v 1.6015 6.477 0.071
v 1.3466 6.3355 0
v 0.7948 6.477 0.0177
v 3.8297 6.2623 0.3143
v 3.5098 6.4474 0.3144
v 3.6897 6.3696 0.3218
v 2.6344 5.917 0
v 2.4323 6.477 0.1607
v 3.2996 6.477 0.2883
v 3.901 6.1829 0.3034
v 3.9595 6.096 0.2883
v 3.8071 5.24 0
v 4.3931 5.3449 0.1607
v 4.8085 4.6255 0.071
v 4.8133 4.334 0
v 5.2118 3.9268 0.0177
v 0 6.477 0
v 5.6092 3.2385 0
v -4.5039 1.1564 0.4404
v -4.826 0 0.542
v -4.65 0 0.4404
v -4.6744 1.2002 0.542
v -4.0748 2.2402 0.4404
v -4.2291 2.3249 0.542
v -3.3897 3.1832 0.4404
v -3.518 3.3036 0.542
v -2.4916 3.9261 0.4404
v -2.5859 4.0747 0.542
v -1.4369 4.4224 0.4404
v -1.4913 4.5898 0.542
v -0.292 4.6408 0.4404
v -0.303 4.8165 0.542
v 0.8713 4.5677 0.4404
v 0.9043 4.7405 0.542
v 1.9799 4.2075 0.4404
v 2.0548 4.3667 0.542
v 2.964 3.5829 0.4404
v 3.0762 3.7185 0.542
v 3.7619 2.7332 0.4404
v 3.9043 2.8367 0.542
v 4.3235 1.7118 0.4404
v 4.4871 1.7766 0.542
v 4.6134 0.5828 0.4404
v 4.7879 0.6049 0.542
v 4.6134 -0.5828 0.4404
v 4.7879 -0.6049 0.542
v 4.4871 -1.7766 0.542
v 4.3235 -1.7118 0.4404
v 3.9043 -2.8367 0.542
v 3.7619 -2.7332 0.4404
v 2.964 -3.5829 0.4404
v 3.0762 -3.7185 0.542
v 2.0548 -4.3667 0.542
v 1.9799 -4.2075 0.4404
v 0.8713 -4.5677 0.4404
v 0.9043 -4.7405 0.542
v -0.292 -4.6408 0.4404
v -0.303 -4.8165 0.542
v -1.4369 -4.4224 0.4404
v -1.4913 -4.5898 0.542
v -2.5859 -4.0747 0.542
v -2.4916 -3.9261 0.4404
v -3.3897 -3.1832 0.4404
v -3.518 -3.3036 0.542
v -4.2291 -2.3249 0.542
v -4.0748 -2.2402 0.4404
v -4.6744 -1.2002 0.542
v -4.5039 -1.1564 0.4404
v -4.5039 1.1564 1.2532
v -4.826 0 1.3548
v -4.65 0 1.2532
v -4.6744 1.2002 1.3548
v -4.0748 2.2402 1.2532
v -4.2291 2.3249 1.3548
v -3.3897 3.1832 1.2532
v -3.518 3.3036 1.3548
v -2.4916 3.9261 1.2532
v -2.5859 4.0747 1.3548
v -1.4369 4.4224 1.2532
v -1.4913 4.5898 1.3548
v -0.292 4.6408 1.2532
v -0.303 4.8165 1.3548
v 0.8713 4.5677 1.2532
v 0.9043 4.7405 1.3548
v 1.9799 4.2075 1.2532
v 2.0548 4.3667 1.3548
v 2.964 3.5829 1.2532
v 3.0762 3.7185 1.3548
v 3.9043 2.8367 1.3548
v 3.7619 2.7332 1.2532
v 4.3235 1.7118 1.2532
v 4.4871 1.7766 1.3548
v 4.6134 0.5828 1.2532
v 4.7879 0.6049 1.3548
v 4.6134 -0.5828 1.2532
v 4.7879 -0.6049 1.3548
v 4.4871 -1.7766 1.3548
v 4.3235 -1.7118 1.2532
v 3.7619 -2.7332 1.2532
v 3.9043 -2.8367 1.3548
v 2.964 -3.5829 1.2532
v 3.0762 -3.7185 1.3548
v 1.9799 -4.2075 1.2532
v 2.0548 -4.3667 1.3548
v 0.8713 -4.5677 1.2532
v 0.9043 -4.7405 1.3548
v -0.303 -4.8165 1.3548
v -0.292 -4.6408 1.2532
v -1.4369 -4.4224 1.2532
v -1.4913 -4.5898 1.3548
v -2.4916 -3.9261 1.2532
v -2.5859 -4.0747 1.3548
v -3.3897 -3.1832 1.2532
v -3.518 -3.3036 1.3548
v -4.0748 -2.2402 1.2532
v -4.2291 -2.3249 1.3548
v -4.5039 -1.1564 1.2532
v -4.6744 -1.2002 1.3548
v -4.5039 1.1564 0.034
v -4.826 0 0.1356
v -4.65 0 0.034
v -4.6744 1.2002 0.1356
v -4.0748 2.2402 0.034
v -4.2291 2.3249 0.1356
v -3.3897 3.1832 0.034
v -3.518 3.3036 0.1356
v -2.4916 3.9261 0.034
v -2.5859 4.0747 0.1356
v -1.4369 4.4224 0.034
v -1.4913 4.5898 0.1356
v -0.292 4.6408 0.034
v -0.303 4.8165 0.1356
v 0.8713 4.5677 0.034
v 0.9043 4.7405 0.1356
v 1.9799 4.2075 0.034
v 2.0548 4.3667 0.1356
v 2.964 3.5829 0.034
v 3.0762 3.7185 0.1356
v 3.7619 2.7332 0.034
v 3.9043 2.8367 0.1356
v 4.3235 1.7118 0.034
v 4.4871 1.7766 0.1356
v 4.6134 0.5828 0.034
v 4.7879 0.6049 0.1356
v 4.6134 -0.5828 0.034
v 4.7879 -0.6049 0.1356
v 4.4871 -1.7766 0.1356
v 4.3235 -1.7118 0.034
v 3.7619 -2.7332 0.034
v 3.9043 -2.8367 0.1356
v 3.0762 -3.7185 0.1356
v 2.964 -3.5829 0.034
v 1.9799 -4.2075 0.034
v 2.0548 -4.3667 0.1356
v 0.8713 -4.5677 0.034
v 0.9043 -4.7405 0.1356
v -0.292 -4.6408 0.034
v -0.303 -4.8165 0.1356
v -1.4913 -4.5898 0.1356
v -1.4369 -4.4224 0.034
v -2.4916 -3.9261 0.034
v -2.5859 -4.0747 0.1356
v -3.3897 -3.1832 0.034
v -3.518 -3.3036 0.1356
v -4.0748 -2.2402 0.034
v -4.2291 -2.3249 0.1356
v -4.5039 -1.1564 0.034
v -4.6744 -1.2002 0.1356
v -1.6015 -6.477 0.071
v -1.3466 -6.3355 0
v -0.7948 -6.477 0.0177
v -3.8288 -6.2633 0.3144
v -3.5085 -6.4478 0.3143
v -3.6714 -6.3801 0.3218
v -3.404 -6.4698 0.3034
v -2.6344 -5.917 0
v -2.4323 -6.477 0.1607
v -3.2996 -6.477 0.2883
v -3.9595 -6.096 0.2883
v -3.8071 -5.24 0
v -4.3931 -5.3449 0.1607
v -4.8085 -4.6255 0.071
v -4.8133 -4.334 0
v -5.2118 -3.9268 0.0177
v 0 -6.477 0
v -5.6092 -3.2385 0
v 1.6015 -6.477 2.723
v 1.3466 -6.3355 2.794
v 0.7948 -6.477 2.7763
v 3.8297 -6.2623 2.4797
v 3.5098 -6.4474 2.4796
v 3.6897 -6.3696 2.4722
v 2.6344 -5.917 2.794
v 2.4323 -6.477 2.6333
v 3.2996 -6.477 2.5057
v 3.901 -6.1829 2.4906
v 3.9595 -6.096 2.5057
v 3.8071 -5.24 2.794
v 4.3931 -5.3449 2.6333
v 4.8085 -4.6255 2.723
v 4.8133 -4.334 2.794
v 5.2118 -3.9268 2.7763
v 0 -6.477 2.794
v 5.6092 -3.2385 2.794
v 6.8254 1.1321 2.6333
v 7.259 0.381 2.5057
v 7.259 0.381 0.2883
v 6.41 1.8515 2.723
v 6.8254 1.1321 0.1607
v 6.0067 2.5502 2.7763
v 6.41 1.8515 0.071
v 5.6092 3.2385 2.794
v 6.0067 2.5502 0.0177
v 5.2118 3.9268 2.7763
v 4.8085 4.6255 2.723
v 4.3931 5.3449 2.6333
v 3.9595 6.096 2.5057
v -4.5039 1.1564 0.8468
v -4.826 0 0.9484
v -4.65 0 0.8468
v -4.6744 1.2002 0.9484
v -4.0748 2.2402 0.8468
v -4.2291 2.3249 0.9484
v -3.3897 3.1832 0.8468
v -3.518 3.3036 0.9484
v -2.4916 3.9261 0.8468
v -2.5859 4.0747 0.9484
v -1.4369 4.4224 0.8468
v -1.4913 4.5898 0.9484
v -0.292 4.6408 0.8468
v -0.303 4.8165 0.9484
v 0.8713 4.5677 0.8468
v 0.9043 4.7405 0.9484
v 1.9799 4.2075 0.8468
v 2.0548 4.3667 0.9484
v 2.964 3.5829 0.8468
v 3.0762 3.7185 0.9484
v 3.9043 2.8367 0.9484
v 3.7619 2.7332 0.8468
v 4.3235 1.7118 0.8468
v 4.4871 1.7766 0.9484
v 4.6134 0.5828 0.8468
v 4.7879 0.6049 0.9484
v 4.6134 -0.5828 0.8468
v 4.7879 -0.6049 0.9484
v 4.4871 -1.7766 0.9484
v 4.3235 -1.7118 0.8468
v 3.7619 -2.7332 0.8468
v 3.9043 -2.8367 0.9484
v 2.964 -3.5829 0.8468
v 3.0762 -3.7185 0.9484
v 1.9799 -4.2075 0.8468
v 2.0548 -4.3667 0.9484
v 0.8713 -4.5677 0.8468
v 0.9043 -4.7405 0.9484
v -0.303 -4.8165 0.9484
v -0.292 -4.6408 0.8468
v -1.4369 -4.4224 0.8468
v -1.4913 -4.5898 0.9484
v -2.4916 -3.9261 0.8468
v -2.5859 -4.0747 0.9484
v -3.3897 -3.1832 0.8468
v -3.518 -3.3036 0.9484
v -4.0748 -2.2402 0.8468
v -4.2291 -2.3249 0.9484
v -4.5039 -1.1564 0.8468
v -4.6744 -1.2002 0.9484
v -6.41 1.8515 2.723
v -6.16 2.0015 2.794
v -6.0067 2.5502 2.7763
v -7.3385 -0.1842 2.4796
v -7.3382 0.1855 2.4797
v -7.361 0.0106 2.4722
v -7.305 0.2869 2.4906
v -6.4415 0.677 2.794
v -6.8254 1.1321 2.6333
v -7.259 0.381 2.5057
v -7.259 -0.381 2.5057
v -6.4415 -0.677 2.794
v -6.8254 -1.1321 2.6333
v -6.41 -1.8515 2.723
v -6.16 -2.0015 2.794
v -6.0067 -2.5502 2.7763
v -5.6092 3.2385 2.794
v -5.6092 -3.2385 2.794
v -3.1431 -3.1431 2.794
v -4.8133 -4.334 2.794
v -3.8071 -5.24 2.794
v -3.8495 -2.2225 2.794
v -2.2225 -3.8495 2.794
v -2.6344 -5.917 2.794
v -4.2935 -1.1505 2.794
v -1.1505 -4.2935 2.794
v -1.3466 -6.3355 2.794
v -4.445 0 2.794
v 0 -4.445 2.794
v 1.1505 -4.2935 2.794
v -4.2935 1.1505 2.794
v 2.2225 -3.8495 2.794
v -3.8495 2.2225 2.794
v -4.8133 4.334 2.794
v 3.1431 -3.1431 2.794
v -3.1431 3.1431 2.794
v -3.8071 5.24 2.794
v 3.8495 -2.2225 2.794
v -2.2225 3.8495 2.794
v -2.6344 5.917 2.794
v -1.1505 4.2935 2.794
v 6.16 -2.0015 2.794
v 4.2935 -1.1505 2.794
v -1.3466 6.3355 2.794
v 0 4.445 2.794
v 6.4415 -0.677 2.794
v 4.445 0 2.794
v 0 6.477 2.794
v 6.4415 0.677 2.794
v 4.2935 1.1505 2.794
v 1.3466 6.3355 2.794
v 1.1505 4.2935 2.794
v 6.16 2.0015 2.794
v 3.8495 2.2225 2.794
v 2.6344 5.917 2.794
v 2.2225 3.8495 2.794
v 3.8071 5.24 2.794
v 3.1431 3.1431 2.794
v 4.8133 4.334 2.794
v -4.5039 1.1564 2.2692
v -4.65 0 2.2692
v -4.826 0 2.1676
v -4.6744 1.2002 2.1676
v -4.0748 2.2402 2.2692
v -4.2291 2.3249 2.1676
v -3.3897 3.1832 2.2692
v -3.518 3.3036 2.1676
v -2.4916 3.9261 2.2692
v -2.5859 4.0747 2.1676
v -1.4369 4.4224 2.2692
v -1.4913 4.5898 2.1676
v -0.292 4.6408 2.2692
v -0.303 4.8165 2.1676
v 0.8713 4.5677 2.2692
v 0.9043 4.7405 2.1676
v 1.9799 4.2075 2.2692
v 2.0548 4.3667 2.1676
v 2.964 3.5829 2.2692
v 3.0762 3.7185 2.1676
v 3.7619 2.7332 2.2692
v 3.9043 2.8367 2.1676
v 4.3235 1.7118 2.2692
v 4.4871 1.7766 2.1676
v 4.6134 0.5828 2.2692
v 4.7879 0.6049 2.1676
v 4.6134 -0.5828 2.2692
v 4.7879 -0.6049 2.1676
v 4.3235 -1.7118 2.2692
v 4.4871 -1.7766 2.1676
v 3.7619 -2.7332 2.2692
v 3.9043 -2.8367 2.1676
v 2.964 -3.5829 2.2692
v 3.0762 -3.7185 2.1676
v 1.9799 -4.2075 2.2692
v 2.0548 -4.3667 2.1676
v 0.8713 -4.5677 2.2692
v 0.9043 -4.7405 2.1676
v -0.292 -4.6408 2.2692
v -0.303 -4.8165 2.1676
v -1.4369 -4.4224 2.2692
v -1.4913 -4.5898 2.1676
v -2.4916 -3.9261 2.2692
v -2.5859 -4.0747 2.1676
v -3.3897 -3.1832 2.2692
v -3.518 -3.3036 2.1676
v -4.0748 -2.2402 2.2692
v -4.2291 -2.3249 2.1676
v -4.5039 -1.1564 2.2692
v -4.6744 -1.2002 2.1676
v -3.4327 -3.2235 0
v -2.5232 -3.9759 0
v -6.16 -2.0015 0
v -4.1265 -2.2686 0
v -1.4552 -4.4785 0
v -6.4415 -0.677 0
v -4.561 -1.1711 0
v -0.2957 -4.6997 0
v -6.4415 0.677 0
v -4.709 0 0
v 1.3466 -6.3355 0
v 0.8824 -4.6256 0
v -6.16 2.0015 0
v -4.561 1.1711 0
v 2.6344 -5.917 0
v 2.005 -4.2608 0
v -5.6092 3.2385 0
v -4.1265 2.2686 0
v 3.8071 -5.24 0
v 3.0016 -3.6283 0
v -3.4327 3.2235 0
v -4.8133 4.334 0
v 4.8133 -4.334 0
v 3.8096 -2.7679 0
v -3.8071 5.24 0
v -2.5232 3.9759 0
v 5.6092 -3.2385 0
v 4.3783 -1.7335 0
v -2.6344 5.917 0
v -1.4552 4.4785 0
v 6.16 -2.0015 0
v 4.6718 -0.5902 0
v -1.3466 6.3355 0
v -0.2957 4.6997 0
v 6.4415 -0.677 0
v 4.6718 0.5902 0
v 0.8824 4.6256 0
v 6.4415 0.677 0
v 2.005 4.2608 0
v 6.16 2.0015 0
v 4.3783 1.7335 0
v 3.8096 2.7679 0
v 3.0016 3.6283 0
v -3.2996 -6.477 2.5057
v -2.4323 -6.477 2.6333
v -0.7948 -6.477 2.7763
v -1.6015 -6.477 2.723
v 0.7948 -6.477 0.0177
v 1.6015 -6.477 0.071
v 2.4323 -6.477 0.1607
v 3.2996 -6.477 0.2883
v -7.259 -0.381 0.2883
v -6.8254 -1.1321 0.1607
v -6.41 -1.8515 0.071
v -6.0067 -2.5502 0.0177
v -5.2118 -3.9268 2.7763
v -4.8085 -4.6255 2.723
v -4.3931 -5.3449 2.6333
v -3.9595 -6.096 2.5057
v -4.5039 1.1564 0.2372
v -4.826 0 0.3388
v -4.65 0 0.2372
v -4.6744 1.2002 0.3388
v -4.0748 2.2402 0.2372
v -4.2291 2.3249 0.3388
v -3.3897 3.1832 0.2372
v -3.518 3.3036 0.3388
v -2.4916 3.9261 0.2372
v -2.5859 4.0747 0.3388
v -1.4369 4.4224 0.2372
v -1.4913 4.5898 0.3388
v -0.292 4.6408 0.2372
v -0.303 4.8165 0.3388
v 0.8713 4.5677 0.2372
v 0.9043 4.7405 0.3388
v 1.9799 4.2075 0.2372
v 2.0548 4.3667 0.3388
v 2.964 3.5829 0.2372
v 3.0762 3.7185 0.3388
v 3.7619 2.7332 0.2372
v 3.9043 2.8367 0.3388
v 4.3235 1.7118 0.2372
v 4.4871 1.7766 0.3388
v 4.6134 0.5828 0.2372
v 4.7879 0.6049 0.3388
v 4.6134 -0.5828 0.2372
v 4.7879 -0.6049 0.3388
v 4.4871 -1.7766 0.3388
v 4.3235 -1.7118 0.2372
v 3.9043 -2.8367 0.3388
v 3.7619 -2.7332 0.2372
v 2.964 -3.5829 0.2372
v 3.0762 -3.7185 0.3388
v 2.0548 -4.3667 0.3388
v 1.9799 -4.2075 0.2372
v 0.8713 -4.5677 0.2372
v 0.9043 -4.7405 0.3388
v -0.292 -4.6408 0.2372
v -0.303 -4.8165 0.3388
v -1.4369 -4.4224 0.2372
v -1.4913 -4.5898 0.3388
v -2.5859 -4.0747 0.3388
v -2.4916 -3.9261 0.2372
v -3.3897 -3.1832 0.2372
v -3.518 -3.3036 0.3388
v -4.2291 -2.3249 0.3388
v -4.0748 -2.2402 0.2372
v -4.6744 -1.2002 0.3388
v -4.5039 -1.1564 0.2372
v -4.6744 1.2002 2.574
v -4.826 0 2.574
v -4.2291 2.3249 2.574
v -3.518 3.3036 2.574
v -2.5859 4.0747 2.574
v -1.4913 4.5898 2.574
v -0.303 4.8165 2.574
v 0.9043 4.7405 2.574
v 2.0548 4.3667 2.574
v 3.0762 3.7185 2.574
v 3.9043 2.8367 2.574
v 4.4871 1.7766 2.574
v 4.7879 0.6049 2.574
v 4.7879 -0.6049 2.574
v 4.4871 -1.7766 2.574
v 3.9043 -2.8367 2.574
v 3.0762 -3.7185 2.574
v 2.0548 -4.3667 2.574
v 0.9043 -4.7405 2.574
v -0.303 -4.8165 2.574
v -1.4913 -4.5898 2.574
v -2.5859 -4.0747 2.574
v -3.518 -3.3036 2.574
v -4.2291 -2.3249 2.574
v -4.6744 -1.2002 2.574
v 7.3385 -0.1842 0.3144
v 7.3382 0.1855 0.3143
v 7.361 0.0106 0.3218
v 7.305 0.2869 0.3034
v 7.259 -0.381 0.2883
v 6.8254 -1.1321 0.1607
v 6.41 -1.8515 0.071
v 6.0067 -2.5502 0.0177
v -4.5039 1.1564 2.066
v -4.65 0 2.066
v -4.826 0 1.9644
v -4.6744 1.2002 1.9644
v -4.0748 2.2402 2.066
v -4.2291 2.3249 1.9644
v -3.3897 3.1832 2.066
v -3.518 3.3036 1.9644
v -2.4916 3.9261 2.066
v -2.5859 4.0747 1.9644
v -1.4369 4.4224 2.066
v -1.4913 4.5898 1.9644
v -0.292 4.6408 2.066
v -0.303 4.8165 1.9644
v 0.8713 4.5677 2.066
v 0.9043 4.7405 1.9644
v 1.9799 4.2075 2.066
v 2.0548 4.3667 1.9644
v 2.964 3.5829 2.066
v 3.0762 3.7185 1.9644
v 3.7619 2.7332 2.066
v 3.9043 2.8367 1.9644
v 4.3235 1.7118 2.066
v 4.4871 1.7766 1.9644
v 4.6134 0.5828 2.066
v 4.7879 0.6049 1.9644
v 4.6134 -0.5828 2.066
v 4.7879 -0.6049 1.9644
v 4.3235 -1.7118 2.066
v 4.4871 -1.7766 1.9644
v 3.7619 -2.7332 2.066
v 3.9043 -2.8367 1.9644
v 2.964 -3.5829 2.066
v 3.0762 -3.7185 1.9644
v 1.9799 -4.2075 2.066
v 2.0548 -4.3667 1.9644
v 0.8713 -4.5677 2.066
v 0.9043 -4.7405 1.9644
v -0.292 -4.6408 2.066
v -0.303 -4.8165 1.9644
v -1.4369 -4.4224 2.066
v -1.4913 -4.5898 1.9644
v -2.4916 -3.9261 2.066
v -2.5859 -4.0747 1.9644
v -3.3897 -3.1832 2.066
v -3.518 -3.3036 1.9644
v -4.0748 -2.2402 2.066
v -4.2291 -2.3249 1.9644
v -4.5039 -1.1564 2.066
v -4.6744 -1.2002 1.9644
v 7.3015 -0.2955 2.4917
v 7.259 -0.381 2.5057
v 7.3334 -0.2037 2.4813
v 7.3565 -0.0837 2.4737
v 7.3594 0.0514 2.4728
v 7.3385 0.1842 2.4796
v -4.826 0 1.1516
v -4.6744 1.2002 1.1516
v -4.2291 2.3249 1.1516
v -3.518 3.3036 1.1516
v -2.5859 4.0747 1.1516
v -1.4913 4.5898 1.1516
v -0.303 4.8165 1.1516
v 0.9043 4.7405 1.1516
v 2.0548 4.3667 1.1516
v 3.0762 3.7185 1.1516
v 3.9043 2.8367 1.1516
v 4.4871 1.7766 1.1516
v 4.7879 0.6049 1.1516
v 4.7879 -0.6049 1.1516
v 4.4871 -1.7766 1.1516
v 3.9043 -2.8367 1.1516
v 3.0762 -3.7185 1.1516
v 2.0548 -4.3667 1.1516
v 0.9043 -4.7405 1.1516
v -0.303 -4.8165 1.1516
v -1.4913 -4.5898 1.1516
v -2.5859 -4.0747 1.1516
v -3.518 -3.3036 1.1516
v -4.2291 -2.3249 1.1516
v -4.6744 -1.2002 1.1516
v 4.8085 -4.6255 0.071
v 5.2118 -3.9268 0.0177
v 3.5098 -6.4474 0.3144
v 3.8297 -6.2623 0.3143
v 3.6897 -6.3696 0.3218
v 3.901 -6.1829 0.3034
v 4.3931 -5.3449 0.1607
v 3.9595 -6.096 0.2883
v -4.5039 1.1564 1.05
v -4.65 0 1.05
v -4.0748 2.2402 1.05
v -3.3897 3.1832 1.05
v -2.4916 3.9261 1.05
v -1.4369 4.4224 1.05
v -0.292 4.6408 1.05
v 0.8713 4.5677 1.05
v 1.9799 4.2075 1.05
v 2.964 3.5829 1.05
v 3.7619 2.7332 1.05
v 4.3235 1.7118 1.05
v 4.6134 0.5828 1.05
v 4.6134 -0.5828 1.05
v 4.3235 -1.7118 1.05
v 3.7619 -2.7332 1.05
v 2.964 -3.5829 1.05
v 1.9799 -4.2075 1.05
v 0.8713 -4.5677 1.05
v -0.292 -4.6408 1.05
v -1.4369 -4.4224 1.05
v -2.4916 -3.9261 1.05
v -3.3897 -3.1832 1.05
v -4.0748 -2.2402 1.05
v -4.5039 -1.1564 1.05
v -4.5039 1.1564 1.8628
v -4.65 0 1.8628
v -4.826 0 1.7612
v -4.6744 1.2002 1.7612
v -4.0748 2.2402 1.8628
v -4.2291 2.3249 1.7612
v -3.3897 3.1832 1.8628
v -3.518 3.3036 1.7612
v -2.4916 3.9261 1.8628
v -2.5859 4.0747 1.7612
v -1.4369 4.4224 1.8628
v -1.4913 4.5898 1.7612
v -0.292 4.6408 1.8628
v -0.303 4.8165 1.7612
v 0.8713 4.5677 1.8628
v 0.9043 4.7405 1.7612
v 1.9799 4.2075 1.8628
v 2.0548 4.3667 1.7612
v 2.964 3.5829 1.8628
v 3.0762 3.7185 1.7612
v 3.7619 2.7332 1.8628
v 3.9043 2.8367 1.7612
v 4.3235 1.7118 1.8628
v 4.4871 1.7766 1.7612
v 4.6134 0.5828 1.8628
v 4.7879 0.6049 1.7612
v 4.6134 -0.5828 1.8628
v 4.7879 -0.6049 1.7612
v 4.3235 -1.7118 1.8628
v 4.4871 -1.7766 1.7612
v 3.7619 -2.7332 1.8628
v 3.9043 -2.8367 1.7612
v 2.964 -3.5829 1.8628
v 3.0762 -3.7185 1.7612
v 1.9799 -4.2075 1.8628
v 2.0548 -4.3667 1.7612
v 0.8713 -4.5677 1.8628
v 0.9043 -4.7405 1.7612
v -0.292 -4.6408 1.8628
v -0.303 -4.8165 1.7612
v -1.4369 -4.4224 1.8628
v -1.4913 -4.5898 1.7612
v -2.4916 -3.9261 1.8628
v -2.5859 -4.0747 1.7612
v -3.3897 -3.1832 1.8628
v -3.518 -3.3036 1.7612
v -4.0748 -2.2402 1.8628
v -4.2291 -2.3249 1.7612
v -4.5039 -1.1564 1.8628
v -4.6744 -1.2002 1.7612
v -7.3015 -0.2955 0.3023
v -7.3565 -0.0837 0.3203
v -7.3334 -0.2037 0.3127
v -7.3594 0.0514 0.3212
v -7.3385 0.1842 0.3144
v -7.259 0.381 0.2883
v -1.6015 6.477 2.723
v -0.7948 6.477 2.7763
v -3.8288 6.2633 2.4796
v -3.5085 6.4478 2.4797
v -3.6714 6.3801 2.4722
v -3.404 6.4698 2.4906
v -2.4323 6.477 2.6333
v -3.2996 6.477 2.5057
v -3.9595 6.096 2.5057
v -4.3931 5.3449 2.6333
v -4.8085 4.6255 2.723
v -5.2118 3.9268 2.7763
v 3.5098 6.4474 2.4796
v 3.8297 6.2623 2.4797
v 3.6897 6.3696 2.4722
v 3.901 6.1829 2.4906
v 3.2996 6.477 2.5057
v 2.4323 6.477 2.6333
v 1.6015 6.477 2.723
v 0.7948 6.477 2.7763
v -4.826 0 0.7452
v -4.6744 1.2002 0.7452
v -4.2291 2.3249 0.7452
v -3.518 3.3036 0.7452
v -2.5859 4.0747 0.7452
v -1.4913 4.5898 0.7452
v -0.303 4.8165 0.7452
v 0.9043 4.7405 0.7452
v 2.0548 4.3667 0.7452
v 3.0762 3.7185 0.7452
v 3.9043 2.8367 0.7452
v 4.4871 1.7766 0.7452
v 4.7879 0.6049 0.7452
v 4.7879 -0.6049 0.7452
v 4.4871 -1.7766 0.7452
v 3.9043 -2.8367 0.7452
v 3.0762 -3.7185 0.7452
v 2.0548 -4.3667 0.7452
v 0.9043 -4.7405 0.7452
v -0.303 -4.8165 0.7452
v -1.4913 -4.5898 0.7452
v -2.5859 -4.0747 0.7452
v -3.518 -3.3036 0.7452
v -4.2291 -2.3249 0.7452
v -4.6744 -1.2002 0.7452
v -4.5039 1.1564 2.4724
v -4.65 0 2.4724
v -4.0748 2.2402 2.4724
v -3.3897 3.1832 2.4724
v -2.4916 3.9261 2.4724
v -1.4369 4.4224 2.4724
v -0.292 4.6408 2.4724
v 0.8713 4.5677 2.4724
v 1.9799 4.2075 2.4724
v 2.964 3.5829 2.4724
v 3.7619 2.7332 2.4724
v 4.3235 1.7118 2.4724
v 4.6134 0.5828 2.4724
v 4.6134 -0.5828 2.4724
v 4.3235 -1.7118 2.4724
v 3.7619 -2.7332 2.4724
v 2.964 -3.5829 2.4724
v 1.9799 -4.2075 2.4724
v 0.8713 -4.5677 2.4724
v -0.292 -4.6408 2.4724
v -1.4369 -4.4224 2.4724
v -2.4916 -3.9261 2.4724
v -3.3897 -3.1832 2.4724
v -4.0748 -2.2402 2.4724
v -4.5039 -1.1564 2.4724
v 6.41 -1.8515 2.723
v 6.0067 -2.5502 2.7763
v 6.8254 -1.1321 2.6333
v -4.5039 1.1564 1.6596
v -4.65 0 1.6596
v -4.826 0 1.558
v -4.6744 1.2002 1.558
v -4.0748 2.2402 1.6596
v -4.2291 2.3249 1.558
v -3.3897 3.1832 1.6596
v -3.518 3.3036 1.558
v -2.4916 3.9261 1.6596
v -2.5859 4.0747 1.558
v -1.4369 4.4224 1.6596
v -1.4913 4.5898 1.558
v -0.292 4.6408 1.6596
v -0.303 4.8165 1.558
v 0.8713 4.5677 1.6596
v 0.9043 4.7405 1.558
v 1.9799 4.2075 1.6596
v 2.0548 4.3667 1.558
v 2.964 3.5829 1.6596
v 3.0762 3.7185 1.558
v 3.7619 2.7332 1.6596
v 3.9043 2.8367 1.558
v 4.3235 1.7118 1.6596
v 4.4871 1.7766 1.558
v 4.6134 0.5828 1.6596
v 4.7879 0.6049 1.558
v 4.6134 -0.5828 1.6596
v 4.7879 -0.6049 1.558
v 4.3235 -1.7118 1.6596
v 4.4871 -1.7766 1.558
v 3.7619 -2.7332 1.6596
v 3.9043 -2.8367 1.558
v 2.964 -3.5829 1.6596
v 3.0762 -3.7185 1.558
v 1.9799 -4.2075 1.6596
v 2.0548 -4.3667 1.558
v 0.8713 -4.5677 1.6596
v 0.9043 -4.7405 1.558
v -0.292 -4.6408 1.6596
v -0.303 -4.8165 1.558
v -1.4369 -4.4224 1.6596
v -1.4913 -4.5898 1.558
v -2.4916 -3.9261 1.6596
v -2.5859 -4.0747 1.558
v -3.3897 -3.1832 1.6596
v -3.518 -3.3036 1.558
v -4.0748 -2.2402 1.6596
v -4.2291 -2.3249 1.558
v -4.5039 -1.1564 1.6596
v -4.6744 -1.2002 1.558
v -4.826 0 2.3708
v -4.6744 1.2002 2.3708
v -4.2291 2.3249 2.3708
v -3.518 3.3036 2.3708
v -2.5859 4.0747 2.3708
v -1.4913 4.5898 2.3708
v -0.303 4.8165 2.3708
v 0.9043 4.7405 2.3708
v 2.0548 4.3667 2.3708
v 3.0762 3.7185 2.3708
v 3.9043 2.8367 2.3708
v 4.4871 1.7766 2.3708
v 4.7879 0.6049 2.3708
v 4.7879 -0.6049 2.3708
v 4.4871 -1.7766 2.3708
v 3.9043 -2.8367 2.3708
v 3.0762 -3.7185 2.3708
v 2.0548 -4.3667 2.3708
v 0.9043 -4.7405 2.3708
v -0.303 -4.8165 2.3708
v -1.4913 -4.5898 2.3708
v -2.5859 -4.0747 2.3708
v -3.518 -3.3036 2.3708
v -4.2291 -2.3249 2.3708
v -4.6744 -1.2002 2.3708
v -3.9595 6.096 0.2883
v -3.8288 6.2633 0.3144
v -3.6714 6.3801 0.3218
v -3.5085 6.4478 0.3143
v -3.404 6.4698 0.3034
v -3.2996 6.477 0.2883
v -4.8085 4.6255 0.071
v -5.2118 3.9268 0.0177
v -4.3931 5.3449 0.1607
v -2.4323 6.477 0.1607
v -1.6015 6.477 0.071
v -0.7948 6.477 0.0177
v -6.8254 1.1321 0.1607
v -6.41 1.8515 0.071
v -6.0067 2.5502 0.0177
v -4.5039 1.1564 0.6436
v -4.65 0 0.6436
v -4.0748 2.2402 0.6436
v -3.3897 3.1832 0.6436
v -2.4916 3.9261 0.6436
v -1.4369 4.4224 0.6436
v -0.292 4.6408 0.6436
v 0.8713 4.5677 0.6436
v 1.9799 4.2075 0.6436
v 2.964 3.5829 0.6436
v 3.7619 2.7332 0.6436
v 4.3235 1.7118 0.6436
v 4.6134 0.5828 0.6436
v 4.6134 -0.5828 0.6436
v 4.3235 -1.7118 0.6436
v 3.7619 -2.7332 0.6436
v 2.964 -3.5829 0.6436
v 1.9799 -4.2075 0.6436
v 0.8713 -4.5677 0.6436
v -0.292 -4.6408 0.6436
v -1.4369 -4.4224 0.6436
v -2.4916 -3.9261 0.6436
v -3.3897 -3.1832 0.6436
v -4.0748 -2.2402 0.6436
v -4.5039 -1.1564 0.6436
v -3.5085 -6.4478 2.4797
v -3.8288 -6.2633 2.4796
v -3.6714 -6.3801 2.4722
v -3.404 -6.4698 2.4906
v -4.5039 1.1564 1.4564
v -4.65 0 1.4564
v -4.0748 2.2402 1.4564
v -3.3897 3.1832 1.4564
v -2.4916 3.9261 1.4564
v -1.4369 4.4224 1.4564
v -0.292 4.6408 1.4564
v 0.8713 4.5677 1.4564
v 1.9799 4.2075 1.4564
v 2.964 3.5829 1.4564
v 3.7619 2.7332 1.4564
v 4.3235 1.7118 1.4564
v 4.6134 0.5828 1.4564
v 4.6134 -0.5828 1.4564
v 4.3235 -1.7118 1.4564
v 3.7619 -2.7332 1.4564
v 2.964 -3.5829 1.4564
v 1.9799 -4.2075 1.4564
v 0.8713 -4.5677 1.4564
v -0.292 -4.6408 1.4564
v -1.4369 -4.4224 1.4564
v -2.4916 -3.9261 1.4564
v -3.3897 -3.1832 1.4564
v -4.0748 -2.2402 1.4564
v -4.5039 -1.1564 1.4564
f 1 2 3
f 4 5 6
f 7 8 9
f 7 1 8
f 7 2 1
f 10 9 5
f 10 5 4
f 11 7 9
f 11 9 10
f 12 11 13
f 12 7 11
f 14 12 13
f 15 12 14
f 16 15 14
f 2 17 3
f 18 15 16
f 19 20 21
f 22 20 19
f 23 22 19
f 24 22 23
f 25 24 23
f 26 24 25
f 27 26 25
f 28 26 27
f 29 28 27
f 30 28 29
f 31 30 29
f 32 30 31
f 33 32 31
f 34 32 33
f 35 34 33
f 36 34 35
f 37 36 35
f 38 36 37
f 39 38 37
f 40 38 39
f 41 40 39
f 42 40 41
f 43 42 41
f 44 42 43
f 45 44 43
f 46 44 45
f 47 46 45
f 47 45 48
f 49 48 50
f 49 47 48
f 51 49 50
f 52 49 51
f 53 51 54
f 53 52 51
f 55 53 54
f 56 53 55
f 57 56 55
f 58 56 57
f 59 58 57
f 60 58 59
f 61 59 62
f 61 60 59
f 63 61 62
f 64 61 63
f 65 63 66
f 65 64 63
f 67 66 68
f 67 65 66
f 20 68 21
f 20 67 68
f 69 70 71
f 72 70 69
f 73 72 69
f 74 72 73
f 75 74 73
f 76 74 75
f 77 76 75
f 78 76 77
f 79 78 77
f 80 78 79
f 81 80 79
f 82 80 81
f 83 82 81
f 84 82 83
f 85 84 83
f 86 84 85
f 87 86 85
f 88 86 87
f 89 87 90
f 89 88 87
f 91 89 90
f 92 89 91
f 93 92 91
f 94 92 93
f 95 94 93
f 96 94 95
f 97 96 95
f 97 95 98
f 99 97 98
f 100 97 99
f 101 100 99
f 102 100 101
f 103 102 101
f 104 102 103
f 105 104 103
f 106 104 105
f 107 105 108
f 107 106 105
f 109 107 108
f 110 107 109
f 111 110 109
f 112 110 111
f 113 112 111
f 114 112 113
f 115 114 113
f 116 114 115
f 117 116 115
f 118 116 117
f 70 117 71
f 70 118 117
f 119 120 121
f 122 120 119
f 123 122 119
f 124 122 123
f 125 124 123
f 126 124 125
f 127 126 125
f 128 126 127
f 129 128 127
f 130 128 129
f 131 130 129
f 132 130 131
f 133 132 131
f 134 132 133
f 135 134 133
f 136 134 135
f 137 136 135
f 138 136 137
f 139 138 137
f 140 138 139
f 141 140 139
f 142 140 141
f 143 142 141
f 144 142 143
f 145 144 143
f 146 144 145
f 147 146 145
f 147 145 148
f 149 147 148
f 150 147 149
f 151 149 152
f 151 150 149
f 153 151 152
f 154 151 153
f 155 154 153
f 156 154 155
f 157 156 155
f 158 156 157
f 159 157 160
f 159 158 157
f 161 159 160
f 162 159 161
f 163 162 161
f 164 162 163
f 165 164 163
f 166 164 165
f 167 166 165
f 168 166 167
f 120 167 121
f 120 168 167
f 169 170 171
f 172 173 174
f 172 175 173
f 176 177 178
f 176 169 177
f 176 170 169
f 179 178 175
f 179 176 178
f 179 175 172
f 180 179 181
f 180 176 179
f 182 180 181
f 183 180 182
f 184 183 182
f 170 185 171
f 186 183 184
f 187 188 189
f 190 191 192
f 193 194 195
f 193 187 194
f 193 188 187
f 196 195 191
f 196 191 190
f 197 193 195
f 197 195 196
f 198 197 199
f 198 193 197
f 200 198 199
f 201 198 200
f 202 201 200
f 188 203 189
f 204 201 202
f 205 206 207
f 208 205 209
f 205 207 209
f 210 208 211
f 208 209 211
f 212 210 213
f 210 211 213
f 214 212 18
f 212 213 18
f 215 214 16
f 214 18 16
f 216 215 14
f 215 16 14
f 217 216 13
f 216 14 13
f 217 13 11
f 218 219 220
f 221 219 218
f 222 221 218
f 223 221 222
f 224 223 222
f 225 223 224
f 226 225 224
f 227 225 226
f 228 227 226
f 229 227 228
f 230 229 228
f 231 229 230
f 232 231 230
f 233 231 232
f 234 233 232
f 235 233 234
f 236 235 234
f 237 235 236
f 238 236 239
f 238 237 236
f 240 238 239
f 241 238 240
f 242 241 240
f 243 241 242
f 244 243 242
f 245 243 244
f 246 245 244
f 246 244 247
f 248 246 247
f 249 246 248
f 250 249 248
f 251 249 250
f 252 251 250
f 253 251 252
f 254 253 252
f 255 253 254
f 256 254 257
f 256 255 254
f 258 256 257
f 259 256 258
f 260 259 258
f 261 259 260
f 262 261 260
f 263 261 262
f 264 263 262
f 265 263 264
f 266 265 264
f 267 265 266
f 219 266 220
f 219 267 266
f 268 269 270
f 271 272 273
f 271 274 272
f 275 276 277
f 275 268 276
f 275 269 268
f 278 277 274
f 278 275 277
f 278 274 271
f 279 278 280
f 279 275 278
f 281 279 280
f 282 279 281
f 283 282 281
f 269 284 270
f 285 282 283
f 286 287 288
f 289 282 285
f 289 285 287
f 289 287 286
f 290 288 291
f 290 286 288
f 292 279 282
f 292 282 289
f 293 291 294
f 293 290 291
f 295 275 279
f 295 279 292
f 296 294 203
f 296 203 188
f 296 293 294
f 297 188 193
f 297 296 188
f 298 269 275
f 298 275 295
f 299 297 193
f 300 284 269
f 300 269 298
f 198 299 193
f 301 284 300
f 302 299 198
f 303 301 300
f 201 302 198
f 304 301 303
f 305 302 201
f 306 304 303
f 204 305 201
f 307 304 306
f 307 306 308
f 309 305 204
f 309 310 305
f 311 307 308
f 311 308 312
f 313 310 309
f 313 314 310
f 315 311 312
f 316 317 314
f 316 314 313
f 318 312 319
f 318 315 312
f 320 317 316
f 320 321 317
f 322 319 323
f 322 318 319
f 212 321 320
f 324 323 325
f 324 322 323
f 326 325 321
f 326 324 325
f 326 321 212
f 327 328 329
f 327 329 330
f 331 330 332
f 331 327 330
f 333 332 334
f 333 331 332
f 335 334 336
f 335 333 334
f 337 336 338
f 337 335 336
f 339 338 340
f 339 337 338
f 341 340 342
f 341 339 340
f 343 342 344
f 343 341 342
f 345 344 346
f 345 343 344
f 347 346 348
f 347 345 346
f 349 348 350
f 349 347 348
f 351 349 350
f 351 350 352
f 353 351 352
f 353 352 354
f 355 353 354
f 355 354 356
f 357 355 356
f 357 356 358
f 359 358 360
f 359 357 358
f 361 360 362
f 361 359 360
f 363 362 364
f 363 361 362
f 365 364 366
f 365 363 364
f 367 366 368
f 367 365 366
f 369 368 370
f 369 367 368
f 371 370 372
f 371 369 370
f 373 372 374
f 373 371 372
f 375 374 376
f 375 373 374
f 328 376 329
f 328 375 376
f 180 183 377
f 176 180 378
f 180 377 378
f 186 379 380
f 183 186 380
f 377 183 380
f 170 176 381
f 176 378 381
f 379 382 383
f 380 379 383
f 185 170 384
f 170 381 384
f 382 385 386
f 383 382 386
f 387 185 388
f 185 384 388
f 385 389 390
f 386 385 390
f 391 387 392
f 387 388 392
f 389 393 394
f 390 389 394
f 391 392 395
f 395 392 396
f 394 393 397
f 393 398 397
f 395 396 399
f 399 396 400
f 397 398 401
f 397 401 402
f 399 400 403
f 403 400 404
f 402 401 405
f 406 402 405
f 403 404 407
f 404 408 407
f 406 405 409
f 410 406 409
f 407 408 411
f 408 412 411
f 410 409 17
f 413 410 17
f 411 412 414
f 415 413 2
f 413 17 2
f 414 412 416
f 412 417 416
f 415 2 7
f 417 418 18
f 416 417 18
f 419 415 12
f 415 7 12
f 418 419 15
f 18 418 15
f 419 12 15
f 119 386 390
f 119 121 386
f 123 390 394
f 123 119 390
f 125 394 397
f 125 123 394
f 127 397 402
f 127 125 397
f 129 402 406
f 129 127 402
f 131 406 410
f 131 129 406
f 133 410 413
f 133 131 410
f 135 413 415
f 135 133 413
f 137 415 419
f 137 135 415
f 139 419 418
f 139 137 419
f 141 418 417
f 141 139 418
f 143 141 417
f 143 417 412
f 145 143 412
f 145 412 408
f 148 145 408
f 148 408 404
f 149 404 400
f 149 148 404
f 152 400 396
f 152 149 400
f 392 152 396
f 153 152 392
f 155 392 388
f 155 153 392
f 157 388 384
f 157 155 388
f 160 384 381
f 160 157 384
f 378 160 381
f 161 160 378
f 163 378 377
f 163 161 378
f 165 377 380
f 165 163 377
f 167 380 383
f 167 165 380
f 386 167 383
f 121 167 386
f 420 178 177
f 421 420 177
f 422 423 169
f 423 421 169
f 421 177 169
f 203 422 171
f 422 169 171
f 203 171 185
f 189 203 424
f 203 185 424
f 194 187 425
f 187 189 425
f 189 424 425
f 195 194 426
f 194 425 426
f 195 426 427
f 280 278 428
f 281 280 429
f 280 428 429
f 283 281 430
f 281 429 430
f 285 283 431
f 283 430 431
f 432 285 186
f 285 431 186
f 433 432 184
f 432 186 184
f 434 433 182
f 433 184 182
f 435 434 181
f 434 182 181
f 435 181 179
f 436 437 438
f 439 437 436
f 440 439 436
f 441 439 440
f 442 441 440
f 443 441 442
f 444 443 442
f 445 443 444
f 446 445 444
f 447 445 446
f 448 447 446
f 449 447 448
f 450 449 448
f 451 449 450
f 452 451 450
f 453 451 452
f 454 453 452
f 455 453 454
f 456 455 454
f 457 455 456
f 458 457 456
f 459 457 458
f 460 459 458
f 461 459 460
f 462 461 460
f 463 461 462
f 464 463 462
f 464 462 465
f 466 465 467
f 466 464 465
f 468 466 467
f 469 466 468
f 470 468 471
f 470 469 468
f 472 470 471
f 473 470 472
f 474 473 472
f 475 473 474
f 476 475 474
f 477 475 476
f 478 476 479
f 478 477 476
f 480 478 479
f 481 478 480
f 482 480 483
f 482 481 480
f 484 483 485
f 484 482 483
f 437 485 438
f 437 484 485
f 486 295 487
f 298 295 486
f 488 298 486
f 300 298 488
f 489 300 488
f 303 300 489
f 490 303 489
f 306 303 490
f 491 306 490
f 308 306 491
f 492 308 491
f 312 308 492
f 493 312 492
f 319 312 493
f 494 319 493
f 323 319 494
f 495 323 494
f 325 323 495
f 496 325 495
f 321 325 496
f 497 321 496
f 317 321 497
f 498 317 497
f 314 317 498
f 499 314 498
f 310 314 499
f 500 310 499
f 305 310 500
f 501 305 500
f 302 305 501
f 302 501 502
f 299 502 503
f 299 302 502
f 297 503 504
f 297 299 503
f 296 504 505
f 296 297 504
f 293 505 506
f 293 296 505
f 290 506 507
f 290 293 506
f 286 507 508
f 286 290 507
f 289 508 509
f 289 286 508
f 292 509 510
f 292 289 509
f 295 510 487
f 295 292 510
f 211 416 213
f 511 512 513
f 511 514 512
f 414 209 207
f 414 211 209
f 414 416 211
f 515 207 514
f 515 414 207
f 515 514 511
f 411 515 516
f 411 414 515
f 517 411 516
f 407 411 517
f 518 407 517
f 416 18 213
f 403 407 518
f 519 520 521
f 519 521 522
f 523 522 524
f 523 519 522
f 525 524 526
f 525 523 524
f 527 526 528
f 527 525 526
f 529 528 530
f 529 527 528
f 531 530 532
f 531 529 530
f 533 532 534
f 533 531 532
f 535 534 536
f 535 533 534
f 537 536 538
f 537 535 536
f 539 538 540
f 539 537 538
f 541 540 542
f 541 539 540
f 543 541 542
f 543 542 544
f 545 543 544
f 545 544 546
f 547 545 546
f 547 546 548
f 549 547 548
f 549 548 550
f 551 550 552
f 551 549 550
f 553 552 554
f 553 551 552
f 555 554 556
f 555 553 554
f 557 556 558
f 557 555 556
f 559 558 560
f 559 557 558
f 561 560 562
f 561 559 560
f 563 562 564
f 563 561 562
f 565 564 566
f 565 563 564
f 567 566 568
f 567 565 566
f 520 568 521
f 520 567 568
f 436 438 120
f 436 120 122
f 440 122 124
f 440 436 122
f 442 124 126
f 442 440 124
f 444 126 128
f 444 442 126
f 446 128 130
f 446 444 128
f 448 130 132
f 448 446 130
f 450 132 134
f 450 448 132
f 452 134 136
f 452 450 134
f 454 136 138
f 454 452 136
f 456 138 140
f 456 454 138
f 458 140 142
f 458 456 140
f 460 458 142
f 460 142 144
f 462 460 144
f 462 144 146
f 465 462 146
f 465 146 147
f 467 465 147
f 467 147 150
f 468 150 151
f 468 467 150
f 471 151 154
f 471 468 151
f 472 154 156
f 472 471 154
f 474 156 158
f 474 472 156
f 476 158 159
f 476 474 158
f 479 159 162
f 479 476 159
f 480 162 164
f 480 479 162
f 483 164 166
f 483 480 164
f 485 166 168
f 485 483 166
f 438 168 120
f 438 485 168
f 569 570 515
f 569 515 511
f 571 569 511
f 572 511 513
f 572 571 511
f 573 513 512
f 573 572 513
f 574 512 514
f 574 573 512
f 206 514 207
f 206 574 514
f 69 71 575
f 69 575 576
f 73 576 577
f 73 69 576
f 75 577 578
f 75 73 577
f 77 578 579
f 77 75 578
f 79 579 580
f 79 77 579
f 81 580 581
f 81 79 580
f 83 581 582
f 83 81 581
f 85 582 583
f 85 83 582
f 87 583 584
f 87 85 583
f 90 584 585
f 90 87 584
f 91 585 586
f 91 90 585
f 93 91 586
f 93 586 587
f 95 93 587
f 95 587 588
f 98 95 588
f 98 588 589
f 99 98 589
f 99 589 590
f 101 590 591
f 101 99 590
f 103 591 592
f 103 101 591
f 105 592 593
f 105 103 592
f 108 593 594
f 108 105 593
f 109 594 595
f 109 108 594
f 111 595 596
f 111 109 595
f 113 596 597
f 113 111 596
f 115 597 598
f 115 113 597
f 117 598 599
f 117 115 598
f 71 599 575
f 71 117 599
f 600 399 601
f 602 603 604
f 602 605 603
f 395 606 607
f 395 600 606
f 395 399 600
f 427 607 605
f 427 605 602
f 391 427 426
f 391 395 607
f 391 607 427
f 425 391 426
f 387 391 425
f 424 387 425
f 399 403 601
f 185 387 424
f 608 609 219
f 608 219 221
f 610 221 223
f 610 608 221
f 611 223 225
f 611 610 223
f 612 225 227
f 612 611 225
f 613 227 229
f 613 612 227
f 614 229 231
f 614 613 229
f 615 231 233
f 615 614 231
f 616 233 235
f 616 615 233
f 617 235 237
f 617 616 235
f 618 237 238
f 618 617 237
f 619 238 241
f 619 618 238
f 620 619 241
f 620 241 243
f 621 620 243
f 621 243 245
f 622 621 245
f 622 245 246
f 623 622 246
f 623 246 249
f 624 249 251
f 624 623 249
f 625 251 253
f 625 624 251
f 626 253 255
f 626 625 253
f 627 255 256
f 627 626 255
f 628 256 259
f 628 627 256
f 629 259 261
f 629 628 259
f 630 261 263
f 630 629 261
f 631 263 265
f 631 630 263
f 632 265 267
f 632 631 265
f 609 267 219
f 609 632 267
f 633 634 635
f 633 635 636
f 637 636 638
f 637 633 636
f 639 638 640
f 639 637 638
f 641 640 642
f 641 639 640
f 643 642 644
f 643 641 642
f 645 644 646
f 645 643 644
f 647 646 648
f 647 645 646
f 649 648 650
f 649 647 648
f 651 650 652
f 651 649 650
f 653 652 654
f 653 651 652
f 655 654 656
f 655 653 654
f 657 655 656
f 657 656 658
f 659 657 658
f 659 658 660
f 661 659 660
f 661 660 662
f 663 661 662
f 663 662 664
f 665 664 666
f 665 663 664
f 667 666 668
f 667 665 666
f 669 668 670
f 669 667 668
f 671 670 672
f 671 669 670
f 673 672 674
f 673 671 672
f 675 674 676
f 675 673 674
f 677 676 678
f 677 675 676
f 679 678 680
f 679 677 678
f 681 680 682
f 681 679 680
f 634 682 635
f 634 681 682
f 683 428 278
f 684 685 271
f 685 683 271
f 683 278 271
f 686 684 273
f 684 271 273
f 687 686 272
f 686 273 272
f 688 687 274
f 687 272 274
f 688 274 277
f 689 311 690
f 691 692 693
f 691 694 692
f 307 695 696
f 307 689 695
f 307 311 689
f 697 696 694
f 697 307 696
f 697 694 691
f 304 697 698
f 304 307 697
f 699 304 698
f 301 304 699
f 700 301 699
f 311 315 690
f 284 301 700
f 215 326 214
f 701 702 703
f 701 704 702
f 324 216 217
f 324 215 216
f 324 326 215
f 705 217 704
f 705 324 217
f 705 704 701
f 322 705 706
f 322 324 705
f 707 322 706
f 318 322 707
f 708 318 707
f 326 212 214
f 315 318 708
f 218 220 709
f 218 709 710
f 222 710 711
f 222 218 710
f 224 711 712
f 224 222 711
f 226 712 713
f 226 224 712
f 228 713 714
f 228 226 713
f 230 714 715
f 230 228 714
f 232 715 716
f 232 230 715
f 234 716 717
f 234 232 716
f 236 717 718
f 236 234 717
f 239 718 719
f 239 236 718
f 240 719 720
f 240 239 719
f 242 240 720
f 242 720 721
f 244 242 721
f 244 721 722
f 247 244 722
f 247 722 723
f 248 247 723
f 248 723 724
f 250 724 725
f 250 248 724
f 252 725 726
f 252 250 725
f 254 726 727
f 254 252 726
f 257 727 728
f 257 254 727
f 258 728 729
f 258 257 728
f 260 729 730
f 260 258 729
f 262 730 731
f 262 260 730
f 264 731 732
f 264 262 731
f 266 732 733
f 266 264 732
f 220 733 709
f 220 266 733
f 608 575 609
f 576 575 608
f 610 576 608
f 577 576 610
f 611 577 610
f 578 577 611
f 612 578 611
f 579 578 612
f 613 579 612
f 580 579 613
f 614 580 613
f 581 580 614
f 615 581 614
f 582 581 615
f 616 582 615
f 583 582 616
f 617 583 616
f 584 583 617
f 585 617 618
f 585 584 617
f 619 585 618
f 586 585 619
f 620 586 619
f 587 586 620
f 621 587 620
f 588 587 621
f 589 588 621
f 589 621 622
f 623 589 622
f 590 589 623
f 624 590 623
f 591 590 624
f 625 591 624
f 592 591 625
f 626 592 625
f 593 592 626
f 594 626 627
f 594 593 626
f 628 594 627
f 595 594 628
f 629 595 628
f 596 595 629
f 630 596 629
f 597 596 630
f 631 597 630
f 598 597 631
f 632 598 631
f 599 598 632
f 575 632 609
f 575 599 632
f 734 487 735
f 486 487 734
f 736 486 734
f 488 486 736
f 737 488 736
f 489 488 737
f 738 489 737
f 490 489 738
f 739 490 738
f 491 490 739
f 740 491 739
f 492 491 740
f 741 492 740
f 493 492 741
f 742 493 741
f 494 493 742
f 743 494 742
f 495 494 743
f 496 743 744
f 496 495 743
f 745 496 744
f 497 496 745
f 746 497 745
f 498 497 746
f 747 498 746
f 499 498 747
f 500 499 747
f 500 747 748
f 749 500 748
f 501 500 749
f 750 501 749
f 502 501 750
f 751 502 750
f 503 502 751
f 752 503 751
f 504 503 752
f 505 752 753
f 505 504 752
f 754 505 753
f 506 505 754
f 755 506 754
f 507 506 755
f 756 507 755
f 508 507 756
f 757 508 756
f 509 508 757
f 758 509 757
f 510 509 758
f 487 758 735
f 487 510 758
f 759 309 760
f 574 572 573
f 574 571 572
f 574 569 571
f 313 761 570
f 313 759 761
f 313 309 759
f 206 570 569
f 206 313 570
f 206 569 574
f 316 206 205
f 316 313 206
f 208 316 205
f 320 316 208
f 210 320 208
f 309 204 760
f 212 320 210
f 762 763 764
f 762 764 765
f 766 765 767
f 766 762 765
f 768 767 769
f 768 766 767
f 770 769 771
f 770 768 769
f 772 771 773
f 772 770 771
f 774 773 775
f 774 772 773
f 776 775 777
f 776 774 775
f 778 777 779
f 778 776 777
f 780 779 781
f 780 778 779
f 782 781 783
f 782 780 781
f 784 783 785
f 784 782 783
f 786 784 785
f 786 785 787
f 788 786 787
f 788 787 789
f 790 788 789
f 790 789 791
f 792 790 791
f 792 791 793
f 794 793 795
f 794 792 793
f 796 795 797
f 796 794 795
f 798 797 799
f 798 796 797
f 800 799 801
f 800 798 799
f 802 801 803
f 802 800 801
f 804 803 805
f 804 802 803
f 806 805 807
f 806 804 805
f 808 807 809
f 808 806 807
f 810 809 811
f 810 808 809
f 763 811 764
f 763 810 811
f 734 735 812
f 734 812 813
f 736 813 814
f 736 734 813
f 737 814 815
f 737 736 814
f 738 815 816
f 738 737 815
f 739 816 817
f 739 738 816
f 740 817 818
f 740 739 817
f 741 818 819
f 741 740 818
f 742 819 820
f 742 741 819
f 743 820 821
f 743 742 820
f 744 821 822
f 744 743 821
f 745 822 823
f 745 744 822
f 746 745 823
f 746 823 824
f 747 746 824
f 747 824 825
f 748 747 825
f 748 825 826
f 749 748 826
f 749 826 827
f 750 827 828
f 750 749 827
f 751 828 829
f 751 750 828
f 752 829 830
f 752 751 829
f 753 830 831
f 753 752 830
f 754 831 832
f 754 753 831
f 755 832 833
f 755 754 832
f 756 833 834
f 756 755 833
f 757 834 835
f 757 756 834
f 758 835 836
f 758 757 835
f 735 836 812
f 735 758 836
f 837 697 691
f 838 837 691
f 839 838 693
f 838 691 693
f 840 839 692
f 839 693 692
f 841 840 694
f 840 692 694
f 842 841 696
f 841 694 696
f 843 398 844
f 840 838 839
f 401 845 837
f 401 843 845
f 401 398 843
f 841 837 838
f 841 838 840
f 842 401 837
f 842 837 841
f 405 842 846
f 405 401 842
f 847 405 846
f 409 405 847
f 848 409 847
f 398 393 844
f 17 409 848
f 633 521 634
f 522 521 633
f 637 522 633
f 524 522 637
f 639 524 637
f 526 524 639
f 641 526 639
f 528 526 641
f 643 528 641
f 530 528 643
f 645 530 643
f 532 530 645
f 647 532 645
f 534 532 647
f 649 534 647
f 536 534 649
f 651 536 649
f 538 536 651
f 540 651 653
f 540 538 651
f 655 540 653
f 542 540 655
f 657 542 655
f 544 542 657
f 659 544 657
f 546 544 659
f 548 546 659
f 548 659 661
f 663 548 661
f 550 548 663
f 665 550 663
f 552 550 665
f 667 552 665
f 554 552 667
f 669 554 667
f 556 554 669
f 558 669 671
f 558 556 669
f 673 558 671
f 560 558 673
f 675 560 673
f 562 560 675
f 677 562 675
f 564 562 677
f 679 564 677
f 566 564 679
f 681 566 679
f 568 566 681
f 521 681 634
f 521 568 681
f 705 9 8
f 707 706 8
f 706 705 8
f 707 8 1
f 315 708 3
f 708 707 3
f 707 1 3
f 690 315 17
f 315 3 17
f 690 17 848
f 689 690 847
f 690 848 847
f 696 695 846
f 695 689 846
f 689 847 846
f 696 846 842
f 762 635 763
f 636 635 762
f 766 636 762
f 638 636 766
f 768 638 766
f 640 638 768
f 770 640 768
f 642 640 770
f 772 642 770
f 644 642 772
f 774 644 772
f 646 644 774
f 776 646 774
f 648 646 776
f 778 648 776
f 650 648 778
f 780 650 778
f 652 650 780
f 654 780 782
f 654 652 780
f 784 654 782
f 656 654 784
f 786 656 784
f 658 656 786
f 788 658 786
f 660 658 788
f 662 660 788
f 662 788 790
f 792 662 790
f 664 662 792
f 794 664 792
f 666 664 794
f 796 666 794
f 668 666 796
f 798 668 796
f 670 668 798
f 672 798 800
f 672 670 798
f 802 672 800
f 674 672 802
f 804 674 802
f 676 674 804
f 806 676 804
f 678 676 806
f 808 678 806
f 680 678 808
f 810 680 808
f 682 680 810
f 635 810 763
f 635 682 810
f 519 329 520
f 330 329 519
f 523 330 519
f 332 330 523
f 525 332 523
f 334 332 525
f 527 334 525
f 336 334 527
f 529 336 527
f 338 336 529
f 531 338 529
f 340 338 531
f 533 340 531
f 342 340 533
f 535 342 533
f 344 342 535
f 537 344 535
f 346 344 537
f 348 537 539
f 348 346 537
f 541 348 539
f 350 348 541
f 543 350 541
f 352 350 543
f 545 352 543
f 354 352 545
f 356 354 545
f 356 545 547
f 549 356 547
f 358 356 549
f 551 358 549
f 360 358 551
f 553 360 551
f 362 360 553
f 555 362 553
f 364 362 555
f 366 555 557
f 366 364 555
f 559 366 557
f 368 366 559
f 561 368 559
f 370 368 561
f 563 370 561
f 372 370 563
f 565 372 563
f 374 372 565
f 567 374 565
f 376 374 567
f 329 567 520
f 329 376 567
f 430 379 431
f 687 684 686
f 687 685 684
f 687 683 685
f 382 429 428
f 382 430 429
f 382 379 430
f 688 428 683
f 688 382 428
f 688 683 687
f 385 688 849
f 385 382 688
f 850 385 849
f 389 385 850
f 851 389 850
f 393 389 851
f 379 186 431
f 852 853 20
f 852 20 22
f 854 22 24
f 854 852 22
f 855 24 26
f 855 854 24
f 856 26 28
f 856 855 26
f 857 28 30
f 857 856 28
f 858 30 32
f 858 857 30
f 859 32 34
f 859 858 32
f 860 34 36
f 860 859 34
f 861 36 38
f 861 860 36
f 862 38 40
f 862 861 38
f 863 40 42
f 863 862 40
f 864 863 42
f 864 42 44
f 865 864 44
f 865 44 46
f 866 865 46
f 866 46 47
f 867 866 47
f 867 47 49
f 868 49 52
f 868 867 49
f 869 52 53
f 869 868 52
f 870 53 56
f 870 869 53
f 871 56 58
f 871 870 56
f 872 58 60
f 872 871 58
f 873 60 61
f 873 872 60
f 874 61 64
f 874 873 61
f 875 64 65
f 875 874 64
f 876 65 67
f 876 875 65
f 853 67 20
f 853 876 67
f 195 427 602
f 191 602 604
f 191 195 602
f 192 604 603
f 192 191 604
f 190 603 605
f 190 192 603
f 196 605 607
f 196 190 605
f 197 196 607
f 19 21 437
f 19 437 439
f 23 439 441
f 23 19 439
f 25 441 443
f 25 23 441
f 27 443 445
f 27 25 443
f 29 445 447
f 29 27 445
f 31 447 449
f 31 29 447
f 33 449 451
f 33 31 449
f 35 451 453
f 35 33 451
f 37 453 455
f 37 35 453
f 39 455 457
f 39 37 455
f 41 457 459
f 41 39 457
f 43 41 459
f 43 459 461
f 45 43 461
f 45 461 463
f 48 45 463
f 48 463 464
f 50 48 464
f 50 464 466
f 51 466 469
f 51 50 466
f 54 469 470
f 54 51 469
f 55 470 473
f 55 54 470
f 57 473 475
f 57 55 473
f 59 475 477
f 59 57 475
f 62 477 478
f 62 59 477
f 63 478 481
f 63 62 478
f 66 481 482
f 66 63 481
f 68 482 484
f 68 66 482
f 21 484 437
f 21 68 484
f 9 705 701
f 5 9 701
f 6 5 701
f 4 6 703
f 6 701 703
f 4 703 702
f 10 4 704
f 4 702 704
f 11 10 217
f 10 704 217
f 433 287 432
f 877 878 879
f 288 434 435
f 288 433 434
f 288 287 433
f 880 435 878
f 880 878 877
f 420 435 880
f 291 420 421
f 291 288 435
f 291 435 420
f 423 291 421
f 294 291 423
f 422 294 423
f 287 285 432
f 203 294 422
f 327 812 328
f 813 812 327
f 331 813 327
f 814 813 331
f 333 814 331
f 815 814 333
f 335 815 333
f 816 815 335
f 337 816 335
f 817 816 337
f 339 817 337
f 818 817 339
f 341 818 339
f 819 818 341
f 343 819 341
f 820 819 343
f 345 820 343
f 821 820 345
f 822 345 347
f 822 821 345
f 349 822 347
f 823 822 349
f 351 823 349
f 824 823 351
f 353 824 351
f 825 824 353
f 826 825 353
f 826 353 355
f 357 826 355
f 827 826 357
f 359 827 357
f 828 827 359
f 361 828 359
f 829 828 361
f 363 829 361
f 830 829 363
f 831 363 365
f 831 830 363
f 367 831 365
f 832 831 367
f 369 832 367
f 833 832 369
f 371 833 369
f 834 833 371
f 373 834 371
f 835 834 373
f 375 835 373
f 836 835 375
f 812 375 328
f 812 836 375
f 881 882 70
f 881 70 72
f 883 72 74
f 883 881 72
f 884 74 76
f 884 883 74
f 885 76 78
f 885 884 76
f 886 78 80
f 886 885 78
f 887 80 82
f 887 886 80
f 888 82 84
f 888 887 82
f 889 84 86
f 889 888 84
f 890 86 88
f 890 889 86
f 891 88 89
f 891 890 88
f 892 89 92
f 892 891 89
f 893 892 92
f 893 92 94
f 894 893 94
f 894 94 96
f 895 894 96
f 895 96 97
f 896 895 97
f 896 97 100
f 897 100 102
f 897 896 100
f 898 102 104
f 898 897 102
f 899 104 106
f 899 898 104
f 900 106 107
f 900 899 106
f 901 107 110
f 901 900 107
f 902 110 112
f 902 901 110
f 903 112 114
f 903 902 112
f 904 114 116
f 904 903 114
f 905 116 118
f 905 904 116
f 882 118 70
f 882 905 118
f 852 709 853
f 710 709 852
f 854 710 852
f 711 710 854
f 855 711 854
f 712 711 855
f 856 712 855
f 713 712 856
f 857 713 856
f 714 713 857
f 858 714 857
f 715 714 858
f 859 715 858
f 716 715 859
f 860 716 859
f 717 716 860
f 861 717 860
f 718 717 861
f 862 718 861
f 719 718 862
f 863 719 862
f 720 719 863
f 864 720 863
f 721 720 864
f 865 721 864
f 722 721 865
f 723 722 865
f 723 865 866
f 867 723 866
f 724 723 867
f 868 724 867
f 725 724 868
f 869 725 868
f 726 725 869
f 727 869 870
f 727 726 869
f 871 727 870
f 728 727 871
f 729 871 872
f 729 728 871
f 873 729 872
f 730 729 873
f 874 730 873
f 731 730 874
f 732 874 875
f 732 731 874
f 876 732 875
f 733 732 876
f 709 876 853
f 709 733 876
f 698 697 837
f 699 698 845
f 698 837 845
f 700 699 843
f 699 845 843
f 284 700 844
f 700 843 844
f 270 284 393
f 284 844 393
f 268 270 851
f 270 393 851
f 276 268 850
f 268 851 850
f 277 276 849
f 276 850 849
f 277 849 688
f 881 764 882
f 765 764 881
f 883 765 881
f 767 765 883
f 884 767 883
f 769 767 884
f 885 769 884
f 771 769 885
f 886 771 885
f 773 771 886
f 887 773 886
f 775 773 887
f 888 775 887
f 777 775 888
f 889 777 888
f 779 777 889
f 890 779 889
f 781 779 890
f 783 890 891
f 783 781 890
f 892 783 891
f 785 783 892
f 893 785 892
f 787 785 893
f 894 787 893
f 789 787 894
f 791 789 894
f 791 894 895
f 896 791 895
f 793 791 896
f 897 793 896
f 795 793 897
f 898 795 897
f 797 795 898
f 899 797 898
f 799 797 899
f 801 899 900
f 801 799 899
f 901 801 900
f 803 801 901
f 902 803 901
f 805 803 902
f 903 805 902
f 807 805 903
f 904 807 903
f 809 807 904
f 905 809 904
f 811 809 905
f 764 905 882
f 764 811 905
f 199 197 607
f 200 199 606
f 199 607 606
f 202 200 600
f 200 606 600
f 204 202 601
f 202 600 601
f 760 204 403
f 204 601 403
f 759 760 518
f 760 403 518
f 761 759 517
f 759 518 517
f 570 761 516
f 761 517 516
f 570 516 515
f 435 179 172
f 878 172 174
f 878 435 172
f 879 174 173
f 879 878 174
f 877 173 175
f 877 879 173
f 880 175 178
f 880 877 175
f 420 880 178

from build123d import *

# Parameters (mm, degrees)
SKETCH1_R          = 4.445
EXTRUDE1_DEPTH     = 2.794
FILLET1_R          = 0.762
SKETCH2_OUTSIDE_W  = 41.532
SKETCH2_OUTSIDE_H  = 39.764
SKETCH2_OUTSIDE_R  = 6.477
CUT_EXTRUDE1_DEPTH = 3.794
CUT_EXTRUDE1_DRAFT = -70
SKETCH3_OUTSIDE_W  = 41.532
SKETCH3_OUTSIDE_H  = 39.764
SKETCH3_OUTSIDE_R  = 6.477
CUT_EXTRUDE2_DEPTH = 3.7940001
CUT_EXTRUDE2_DRAFT = -70
LPATTERN1_COUNT    = 14
LPATTERN1_PITCH    = 0.2032


with BuildPart() as part:
    # Sketch1 → Extrude1 (new body)
    with BuildSketch(Plane.XY):
        Polygon((-7.478995387, 0), (-3.739497694, -6.477), (3.739497694, -6.477), (7.478995387, 0), (3.739497694, 6.477), (-3.739497694, 6.477), align=None)
        Circle(SKETCH1_R, mode=Mode.SUBTRACT)
    extrude(amount=EXTRUDE1_DEPTH)

    # Fillet1
    fillet1_edges = [part.edges().sort_by_distance(p)[0] for p in [
        (7.478995387, 0, 1.397),
        (3.739497694, -6.477, 1.397),
        (-3.739497694, -6.477, 1.397),
        (-7.478995387, 0, 1.397),
        (-3.739497694, 6.477, 1.397),
        (3.739497694, 6.477, 1.397),
    ]]
    fillet(fillet1_edges, radius=FILLET1_R)


with BuildPart() as cut_extrude1_tool:
    # Sketch2 outside → Cut-Extrude1 (with draft: the straight prism first)
    with BuildSketch(Plane.XY.offset(2.794)):
        Rectangle(SKETCH2_OUTSIDE_W, SKETCH2_OUTSIDE_H)
        Circle(SKETCH2_OUTSIDE_R, mode=Mode.SUBTRACT)
    extrude(amount=-CUT_EXTRUDE1_DEPTH)
    # Cut-Extrude1: the draft: its side faces are tilted about the plane it starts from
    cut_extrude1_sides = [cut_extrude1_tool.faces().sort_by_distance(p)[0] for p in [
        (0, -19.882, 0.897),
        (20.766, 0, 0.897),
        (0, 19.882, 0.897),
        (-20.766, 0, 0.897),
        (-6.477, 0, 0.897),
    ]]
    draft(cut_extrude1_sides, Plane.XY.offset(2.794), CUT_EXTRUDE1_DRAFT)


with BuildPart() as part_1:
    add(part.part)

    # Cut-Extrude1: cut by cut_extrude1_tool
    add(cut_extrude1_tool.part, mode=Mode.SUBTRACT)


with BuildPart() as cut_extrude2_tool:
    # Sketch3 outside → Cut-Extrude2 (with draft: the straight prism first)
    with BuildSketch(Plane(origin=(0, 0, 0), x_dir=(-1, 0, 0), z_dir=(0, 0, -1))):
        Rectangle(SKETCH3_OUTSIDE_W, SKETCH3_OUTSIDE_H)
        Circle(SKETCH3_OUTSIDE_R, mode=Mode.SUBTRACT)
    extrude(amount=-CUT_EXTRUDE2_DEPTH)
    # Cut-Extrude2: the draft: its side faces are tilted about the plane it starts from
    cut_extrude2_sides = [cut_extrude2_tool.faces().sort_by_distance(p)[0] for p in [
        (0, -19.882, 1.89700005),
        (-20.766, 0, 1.89700005),
        (0, 19.882, 1.89700005),
        (20.766, 0, 1.89700005),
        (6.477, 0, 1.89700005),
    ]]
    draft(cut_extrude2_sides, Plane(origin=(0, 0, 0), x_dir=(-1, 0, 0), z_dir=(0, 0, -1)), CUT_EXTRUDE2_DRAFT)


with BuildPart() as part_2:
    add(part_1.part)

    # Cut-Extrude2: cut by cut_extrude2_tool
    add(cut_extrude2_tool.part, mode=Mode.SUBTRACT)

    # Sketch4 → Cut-Revolve1 (revolve, cut)
    with BuildSketch(Plane(origin=(0, 0, 0), x_dir=(1, 0, 0), z_dir=(0, 1, 0))):
        Polygon((-4.445, -2.794), (-4.445, -2.354059095), (-4.826, -2.574029547), align=None)
    cut_revolve1 = revolve(axis=Axis((0, 0, 2.794), (0, 0, -1)), mode=Mode.SUBTRACT)

    # LPattern1: Cut-Revolve1 ×14
    with Locations(*[(0, 0, -i * LPATTERN1_PITCH) for i in range(1, LPATTERN1_COUNT)]):
        add(cut_revolve1, mode=Mode.SUBTRACT)


solid = part_2.part
